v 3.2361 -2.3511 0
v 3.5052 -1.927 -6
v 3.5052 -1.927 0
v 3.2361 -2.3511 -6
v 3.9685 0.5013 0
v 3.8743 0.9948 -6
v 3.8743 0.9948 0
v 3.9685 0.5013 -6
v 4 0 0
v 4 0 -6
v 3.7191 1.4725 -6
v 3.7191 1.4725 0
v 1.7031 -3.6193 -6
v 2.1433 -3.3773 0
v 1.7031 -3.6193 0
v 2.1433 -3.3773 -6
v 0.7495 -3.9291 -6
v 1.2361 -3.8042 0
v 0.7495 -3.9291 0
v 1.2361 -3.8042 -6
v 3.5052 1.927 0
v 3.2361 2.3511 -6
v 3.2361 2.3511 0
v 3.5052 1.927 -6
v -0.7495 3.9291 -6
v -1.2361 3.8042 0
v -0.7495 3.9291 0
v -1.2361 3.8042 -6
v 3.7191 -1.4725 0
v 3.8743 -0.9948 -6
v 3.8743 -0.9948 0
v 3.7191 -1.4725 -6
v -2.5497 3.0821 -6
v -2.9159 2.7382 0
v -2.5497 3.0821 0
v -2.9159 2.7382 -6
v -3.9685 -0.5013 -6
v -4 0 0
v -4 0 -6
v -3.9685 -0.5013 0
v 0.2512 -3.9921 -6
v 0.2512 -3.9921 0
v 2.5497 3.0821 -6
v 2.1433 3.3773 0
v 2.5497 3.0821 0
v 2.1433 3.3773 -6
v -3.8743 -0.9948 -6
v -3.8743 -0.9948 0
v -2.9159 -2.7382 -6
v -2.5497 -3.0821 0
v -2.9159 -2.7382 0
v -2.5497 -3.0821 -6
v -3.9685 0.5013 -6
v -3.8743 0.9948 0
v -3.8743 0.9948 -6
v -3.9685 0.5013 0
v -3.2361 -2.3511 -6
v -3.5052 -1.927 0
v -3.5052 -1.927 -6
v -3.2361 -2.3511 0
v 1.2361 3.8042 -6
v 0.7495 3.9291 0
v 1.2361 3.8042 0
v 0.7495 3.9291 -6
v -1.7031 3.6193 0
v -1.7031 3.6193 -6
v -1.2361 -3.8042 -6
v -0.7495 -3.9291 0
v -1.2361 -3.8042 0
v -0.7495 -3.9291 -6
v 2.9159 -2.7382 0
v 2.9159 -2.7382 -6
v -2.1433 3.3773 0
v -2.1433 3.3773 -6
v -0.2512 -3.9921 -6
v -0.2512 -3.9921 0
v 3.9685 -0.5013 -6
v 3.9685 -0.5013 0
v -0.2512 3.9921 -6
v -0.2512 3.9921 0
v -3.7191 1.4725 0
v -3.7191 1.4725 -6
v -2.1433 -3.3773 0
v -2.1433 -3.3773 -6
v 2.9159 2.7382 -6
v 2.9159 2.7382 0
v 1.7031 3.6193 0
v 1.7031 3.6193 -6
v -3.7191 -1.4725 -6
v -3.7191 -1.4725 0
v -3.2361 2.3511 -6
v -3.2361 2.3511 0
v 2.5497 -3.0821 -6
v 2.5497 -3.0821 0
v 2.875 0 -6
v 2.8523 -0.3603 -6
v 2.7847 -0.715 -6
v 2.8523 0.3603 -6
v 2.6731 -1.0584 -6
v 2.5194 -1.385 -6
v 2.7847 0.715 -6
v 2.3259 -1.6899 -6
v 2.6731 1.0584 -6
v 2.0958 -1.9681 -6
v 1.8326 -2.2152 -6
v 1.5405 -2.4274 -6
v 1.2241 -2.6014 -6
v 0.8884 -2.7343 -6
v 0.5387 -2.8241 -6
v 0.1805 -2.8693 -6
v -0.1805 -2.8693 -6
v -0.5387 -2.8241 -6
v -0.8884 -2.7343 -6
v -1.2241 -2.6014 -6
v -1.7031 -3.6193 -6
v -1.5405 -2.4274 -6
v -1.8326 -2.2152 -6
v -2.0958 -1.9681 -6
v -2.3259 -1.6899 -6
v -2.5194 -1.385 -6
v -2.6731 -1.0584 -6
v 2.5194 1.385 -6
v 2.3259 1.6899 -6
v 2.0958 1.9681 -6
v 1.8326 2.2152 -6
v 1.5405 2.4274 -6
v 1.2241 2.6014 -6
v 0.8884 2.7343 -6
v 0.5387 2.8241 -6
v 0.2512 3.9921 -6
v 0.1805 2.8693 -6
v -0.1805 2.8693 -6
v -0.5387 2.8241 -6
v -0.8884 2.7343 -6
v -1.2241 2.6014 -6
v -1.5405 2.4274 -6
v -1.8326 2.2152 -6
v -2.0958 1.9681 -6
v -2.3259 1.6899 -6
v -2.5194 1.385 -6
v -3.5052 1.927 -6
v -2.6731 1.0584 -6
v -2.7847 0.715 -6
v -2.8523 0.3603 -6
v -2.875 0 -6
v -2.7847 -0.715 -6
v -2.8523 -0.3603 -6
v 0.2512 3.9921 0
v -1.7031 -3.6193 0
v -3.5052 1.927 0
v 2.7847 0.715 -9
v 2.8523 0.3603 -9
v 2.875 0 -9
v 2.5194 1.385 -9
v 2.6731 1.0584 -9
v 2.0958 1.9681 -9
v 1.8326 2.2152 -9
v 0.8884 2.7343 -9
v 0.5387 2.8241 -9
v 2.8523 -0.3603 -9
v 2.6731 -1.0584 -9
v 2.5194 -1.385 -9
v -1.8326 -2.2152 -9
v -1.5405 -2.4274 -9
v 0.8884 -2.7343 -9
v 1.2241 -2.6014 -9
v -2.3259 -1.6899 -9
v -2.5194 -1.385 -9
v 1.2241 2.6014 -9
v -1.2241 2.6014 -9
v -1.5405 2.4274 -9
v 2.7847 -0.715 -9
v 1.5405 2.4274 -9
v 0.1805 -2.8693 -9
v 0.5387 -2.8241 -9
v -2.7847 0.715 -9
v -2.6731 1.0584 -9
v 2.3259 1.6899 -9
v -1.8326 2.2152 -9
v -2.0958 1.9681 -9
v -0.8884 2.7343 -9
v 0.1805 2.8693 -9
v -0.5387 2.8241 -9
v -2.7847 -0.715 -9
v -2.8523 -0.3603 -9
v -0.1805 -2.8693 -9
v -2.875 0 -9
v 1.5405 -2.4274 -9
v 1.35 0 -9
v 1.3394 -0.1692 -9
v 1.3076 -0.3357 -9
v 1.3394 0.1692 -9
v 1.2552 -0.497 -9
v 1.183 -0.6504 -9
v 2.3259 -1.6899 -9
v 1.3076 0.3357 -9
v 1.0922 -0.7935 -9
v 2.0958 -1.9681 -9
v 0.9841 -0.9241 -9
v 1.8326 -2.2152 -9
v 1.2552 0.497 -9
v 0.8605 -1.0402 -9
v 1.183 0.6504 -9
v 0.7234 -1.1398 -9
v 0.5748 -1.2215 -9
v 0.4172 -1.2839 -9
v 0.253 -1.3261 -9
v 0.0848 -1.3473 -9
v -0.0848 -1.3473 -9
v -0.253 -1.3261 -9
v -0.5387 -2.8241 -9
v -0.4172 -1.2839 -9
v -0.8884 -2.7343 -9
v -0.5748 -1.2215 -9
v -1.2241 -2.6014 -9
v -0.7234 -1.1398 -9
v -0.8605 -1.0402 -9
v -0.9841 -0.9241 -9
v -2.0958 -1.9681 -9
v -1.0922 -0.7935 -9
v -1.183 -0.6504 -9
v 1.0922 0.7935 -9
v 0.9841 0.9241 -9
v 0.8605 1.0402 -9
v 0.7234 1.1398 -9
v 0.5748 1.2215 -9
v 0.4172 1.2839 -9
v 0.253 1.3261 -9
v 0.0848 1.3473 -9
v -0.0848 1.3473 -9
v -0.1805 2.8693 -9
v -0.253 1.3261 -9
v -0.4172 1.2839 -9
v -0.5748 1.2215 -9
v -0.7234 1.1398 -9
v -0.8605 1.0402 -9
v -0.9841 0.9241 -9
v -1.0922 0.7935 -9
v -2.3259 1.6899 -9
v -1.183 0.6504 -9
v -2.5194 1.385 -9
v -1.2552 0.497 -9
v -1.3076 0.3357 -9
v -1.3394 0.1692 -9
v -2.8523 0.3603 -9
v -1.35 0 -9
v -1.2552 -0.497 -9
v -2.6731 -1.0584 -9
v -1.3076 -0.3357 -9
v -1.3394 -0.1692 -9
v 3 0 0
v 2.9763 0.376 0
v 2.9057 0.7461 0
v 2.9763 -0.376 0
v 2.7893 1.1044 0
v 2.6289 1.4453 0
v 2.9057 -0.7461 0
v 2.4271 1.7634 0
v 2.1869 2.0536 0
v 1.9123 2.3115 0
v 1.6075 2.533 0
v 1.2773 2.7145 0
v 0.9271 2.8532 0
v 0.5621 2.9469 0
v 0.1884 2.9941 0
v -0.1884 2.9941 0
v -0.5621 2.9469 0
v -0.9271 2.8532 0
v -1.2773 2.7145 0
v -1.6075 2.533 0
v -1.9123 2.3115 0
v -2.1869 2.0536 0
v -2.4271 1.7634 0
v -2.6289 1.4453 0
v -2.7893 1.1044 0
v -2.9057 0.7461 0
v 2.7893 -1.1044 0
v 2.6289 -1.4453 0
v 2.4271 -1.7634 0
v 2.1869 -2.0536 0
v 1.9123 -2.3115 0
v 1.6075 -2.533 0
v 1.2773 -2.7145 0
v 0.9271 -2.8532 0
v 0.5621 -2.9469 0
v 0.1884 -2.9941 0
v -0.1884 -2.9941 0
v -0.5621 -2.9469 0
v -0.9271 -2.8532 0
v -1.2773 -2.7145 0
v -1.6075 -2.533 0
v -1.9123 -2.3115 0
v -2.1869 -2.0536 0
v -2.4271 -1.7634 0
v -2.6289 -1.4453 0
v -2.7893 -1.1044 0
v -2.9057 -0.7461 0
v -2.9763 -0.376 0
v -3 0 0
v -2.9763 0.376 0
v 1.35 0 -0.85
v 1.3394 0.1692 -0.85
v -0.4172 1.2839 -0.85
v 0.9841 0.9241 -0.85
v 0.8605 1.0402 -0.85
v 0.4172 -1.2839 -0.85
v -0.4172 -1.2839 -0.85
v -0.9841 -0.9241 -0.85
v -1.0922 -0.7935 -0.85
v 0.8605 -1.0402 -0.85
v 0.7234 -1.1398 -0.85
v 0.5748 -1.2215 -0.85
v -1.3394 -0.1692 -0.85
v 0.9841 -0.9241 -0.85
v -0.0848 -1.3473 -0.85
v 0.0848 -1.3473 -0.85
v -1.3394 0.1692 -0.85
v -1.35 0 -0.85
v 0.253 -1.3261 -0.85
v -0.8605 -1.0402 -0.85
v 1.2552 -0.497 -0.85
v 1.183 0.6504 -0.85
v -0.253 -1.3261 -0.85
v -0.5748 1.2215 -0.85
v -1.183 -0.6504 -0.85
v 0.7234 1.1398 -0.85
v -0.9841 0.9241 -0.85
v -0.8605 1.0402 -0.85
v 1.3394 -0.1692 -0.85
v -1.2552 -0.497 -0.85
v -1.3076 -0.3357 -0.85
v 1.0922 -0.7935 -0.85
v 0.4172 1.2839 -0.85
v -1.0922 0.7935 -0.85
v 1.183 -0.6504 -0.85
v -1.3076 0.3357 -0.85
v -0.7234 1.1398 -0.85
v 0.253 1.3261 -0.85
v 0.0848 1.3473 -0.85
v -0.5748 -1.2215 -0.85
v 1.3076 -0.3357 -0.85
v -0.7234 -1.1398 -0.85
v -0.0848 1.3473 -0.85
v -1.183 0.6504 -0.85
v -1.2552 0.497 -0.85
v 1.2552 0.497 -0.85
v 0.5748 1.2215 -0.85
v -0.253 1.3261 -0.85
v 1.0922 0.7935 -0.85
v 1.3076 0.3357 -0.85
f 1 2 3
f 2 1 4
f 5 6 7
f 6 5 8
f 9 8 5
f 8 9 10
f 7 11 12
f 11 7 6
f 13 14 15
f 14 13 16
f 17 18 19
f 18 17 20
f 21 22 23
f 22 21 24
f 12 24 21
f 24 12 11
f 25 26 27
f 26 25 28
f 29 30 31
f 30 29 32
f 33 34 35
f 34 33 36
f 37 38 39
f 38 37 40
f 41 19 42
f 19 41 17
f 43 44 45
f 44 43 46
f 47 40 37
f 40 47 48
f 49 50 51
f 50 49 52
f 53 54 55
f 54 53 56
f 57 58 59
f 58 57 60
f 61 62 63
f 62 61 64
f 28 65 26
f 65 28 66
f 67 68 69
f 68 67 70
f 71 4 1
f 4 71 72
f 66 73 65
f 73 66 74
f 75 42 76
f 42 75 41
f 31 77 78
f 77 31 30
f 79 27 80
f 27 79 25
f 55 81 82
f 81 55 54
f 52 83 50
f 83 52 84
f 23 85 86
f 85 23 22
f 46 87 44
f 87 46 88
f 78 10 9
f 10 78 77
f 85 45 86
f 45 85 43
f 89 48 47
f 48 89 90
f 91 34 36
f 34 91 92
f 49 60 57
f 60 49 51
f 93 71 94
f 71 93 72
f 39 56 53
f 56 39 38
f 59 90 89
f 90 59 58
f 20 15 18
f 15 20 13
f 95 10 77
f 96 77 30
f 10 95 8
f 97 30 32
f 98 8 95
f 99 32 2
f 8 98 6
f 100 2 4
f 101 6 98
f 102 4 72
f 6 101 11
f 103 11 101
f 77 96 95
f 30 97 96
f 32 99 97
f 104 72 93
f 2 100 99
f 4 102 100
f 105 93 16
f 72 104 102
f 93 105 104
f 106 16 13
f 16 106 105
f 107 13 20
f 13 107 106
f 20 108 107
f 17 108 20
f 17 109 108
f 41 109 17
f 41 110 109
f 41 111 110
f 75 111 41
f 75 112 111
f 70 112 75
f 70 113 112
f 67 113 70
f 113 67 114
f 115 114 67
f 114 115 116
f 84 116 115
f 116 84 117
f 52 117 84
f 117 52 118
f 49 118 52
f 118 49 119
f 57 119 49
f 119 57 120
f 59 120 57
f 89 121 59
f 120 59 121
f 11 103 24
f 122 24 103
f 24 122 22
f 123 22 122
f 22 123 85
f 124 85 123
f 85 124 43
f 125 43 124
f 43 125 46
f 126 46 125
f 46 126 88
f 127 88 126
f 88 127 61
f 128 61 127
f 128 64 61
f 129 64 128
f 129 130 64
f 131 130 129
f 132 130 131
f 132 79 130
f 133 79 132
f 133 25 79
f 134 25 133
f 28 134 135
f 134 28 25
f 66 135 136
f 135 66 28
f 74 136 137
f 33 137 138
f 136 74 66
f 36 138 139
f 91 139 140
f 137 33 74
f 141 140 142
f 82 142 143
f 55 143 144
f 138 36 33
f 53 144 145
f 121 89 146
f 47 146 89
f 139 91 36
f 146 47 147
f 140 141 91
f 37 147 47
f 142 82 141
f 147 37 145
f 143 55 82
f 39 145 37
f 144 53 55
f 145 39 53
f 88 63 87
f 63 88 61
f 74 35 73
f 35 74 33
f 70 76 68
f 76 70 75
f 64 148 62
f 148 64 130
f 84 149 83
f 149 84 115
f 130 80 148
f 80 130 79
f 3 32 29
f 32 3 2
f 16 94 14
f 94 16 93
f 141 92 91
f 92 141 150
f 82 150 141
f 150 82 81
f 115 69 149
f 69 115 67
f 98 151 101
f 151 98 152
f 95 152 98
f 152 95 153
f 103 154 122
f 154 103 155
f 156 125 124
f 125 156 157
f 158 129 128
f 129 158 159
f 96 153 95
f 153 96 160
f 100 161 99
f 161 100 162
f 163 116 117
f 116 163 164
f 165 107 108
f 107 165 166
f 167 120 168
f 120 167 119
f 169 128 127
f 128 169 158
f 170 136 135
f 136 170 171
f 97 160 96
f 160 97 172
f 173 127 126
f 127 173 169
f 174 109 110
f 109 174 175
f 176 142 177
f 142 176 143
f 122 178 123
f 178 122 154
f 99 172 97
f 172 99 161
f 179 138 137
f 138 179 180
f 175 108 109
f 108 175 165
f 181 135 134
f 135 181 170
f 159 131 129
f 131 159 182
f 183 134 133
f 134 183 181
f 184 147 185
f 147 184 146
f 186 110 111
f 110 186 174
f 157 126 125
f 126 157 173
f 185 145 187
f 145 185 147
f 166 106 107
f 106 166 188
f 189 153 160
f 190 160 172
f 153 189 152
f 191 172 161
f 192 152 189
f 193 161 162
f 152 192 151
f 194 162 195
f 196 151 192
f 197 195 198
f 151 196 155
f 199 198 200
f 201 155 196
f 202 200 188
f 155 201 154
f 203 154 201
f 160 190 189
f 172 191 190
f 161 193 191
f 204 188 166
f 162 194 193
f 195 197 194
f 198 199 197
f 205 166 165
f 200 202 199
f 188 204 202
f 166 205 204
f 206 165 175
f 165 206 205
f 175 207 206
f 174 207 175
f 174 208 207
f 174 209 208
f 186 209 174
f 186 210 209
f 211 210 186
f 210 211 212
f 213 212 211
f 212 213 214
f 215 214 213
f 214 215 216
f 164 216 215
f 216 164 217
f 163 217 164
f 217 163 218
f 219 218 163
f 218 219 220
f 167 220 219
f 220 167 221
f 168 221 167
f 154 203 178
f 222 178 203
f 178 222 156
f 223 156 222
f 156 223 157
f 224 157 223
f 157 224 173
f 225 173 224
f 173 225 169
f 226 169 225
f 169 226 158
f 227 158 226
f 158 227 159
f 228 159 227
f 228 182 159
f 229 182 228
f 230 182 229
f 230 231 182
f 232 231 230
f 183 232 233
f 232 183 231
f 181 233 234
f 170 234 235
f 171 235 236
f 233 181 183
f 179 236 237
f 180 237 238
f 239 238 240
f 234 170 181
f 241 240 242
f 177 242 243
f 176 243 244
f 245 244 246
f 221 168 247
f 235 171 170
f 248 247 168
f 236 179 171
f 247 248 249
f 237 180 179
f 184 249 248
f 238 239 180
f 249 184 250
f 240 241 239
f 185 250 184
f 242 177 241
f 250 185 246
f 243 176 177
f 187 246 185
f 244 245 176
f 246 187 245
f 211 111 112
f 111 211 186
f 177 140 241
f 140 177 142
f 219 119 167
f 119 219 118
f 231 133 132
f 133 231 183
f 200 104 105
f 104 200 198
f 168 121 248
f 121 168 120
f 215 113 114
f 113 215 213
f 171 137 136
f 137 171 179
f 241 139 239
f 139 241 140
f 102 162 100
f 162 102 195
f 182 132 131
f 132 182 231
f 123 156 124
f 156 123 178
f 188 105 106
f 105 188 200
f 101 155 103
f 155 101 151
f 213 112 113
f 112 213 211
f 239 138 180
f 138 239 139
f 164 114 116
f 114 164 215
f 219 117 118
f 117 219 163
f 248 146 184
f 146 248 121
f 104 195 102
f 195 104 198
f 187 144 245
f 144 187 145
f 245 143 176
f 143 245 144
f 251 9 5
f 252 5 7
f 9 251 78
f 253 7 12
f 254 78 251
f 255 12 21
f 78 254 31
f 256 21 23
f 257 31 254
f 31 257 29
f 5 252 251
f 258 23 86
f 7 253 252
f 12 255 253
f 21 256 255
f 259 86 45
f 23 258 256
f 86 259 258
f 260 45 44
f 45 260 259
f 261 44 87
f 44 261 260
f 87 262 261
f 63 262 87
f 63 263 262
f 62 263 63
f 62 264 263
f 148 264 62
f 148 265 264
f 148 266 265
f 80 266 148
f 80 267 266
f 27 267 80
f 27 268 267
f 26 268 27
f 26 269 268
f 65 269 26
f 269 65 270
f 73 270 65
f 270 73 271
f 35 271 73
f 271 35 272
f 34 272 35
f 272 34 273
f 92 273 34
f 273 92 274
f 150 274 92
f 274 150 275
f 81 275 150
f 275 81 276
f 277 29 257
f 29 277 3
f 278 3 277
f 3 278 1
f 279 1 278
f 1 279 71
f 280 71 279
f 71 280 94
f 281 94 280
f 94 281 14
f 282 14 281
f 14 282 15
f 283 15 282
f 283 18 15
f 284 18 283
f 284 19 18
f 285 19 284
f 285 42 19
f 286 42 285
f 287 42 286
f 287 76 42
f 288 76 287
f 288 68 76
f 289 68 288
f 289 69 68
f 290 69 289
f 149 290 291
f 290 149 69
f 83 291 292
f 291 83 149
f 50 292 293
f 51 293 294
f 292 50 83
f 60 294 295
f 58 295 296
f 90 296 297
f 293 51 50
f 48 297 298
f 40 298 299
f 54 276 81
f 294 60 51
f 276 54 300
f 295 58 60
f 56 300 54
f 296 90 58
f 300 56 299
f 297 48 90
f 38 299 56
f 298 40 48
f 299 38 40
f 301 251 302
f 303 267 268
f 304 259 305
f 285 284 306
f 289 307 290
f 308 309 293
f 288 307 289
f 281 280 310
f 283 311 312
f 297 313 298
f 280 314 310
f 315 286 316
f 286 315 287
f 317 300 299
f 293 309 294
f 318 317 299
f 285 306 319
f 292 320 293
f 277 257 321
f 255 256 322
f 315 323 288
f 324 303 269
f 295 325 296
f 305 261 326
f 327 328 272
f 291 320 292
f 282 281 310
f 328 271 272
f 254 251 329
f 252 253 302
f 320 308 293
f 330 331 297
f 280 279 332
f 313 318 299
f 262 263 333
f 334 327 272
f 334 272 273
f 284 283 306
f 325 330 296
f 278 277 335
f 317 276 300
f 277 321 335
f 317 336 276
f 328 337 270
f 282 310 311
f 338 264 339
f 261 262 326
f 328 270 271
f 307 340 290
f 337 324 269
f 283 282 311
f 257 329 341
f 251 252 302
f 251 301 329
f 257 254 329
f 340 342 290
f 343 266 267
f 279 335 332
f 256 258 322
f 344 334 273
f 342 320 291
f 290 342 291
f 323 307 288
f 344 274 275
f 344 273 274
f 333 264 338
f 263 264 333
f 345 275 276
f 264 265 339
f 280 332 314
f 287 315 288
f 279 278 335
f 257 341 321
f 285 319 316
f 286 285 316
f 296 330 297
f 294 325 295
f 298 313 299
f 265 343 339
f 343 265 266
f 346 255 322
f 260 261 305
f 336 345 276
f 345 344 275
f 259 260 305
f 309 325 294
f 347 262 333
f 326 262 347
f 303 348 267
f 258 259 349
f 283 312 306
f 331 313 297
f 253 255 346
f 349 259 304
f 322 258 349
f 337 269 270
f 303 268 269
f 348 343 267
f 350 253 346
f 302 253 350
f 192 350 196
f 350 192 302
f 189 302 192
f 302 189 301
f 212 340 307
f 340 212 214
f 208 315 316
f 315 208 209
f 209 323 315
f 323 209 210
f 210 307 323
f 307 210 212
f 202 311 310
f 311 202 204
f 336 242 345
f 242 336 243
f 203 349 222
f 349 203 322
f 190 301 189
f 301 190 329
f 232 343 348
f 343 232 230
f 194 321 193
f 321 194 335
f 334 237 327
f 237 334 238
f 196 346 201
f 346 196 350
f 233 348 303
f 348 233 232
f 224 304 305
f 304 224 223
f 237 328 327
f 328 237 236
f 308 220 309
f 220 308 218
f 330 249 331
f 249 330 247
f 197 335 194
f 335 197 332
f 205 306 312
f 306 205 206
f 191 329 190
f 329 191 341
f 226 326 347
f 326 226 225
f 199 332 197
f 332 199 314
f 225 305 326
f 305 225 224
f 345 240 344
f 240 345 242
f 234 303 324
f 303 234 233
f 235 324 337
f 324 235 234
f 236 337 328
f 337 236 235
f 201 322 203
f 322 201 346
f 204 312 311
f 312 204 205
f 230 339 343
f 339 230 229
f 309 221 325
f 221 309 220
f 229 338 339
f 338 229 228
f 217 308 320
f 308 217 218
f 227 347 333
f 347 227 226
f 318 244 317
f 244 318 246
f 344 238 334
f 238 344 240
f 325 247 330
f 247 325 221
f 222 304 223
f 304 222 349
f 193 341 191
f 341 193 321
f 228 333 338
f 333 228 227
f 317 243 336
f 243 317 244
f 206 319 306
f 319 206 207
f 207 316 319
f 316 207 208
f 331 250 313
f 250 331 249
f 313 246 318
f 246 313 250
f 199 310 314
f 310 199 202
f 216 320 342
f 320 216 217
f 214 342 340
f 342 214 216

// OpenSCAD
$fn = 50;

difference() {
	union() {
		translate(v = [0, 0, -6.0]) {
			cylinder(h = 9, r = 4.0);
		}
		#translate(v = [0, 0, -9.0]) {
			cylinder(h = 9, r = 2.875);
		}
	}
	union() {
		translate(v = [0, 0, 0]) {
			rotate(a = [0, 0, 0]) {
				difference() {
					union() {
						translate(v = [0, 0, -9.0]) {
							cylinder(h = 9, r = 1.0);
						}
						translate(v = [0, 0, -0.85]) {
							cylinder(h = 0.85, r1 = 1.35, r2 = 3.0);
						}
						translate(v = [0, 0, -9.0]) {
							cylinder(h = 9, r = 1.35);
						}
						translate(v = [0, 0, -9.0]) {
							cylinder(h = 9, r = 1.0);
						}
					}
					union();
				}
			}
		}
		#cylinder(h = 3, r = 5.0);
	}
}
